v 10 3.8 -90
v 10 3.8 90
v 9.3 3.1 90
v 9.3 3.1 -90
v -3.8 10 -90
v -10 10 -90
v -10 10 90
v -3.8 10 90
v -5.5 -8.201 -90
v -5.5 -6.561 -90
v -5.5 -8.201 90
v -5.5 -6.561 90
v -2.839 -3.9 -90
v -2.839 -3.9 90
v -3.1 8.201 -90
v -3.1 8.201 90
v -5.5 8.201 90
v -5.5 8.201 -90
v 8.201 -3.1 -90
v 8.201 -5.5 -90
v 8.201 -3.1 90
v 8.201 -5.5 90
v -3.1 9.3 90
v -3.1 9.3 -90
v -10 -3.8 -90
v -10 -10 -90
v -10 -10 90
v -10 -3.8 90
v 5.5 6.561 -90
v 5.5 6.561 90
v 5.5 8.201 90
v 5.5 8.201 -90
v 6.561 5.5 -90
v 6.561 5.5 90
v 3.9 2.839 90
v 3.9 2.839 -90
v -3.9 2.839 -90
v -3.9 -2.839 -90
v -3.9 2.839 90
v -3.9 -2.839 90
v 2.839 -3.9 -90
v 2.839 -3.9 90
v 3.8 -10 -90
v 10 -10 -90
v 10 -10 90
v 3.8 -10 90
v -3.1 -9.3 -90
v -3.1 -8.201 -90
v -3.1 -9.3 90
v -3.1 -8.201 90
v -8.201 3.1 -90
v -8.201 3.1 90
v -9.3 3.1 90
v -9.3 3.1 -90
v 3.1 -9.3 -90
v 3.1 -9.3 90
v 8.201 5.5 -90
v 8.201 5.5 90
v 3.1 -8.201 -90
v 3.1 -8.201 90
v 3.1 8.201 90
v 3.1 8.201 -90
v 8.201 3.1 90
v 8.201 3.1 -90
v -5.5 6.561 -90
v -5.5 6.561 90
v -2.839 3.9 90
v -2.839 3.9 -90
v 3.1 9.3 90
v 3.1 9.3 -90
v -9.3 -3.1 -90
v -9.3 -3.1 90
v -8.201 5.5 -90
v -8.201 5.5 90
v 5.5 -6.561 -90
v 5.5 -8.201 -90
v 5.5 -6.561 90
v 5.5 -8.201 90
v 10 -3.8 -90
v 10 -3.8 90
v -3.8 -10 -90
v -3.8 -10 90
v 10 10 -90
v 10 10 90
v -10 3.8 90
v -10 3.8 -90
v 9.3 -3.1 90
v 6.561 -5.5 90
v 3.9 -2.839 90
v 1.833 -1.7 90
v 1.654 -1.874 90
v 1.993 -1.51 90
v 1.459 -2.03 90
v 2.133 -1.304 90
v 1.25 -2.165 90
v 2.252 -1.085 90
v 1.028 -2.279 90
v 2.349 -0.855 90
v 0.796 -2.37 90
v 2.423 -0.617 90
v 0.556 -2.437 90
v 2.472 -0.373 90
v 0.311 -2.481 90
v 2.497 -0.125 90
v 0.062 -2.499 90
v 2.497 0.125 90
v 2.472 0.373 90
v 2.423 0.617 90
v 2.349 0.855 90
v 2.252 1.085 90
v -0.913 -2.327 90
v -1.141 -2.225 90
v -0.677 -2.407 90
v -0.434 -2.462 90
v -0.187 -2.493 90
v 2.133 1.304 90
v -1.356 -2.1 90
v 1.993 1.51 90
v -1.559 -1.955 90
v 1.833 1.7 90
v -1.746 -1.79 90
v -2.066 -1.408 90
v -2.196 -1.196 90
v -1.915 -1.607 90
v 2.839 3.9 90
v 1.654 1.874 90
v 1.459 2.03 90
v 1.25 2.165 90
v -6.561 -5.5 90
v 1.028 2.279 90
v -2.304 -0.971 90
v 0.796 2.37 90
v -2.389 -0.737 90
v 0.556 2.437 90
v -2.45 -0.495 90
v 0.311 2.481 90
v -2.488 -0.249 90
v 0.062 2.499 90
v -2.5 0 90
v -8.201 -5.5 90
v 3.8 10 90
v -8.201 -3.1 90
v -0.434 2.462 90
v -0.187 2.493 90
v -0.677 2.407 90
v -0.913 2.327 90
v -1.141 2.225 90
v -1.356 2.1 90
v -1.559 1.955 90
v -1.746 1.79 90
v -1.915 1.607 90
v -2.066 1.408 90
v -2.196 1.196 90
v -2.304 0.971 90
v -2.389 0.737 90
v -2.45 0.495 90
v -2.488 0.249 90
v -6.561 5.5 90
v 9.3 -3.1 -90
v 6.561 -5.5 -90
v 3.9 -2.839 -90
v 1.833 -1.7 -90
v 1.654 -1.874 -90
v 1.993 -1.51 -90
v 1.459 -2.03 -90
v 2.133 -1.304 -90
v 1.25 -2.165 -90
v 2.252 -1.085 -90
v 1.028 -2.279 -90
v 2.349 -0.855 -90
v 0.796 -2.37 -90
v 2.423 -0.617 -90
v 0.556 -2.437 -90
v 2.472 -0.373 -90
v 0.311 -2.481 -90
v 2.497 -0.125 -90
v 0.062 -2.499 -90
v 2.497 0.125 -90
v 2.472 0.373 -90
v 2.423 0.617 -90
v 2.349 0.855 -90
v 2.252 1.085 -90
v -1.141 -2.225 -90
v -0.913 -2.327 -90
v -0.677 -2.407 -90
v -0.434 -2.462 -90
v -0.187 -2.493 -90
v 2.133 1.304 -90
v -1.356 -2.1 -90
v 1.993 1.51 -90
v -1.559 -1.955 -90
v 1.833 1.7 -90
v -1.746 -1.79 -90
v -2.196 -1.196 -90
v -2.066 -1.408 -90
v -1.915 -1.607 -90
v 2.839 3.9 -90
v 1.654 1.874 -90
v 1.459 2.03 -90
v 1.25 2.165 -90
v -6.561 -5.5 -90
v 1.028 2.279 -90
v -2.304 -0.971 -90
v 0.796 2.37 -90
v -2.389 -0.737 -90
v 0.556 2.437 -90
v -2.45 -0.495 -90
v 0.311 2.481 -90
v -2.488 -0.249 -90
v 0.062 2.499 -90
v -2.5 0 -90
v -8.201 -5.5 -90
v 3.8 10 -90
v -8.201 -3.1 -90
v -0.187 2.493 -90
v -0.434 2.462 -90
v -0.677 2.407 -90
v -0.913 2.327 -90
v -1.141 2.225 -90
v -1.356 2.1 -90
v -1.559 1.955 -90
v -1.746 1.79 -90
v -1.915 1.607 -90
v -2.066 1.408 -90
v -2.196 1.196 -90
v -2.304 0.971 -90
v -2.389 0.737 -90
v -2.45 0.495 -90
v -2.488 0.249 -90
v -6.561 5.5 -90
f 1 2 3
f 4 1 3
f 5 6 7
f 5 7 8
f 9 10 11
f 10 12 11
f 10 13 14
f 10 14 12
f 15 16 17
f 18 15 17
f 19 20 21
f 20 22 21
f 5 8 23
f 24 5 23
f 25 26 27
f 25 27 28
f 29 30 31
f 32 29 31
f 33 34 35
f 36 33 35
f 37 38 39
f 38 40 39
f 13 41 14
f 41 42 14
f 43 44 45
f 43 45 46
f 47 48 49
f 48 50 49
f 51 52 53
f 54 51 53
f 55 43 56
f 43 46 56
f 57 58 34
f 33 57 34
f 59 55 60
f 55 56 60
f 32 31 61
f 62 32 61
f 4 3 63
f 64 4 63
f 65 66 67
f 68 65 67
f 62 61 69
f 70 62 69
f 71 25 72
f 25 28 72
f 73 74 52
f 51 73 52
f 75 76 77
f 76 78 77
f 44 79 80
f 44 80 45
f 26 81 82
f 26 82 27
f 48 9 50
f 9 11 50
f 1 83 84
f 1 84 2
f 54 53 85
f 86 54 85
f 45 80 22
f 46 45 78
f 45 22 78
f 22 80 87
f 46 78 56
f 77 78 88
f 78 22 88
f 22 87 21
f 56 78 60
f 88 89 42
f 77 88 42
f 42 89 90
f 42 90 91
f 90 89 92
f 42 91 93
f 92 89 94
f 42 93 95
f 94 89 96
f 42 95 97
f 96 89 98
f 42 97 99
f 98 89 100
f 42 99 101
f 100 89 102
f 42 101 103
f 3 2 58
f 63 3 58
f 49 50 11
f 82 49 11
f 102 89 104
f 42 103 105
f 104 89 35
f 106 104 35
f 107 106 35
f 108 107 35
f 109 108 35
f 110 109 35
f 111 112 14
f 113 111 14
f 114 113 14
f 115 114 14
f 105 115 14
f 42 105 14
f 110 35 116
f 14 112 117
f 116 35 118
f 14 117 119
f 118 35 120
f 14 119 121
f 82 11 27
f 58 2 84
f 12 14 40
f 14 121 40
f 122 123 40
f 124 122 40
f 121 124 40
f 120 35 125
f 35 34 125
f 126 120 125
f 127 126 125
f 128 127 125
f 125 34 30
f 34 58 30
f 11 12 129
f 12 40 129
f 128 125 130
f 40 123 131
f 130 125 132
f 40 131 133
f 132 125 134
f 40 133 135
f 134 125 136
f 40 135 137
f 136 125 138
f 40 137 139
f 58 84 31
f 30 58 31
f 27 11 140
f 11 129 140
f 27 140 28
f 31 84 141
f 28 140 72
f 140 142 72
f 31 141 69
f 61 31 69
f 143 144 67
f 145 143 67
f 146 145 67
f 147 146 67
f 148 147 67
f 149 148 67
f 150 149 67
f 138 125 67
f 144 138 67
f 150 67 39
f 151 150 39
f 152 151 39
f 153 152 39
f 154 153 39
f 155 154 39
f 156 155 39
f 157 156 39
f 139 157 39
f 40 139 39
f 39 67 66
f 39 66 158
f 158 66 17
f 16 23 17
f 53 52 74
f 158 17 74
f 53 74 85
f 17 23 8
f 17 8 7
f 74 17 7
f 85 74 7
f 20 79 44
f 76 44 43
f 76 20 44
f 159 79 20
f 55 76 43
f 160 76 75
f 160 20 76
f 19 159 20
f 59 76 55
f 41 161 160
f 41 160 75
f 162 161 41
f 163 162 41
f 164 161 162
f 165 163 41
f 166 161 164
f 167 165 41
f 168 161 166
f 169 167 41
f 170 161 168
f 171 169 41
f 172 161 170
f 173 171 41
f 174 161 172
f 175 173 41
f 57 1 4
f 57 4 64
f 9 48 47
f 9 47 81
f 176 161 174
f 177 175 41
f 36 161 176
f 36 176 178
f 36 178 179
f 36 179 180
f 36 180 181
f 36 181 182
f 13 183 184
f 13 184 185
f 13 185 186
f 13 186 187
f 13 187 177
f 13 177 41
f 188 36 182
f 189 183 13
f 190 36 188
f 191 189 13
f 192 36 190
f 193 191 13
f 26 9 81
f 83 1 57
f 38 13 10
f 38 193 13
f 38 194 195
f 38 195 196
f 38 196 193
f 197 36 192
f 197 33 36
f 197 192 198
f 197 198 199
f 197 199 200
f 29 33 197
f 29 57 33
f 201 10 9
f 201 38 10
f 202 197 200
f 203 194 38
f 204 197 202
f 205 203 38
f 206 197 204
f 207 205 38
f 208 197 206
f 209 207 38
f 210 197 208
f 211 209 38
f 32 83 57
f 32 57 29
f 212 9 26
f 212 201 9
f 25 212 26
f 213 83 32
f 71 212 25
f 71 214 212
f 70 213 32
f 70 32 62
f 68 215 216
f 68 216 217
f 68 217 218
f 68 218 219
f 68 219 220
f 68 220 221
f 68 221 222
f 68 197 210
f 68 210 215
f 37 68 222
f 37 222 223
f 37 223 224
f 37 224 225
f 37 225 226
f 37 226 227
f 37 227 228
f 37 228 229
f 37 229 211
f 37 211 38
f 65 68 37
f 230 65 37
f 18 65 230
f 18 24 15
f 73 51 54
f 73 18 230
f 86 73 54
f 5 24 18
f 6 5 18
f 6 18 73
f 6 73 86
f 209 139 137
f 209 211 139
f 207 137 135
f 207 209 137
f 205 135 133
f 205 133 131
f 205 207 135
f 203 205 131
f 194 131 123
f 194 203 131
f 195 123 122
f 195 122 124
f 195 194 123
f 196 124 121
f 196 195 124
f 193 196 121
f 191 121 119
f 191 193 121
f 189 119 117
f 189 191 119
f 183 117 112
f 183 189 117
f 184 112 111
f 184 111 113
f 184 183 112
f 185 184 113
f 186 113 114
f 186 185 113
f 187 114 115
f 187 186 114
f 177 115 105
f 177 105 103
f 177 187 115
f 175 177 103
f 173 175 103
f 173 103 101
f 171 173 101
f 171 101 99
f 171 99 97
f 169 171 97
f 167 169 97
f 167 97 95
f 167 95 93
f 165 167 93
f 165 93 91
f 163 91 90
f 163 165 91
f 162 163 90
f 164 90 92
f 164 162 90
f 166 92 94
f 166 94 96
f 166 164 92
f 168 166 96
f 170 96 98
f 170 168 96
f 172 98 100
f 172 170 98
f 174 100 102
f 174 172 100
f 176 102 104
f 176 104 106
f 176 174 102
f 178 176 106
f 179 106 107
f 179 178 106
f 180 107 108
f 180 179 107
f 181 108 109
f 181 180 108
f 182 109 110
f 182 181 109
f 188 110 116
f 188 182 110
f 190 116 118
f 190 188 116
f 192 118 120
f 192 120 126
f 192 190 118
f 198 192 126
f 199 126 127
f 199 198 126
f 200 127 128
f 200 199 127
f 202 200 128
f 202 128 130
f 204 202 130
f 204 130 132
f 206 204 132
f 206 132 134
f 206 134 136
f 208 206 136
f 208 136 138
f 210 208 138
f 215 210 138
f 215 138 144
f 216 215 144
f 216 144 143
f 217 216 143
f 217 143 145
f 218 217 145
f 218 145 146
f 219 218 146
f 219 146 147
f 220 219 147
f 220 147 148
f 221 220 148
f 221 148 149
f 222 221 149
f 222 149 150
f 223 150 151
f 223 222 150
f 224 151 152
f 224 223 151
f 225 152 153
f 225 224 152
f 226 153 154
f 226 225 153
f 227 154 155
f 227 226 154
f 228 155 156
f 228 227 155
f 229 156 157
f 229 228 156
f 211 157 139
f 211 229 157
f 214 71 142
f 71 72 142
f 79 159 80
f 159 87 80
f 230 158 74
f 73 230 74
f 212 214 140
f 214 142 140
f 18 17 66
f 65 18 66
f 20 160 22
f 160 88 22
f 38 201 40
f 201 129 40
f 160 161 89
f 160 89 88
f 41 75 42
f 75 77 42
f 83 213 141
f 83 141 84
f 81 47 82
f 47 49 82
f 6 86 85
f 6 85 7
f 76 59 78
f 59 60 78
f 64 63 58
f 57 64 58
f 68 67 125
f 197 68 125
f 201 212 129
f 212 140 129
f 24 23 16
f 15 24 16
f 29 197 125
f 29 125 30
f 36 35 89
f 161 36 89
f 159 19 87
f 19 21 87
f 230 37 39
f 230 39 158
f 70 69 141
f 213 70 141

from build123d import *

# Parameters (mm, degrees)
SKETCH1_R           = 2.5
BOSS_EXTRUDE1_DEPTH = 90


with BuildPart() as part:
    # Sketch1 → Boss-Extrude1 (new, symmetric)
    with BuildSketch(Plane.XY):
        Polygon((3.9, -2.839339828), (6.560660172, -5.5), (8.200660172, -5.5), (8.200660172, -3.1), (9.3, -3.1), (10, -3.8), (10, -10), (3.8, -10), (3.1, -9.3), (3.1, -8.200660172), (5.5, -8.200660172), (5.5, -6.560660172), (2.839339828, -3.9), (-2.839339828, -3.9), (-5.5, -6.560660172), (-5.5, -8.200660172), (-3.1, -8.200660172), (-3.1, -9.3), (-3.8, -10), (-10, -10), (-10, -3.8), (-9.3, -3.1), (-8.200660172, -3.1), (-8.200660172, -5.5), (-6.560660172, -5.5), (-3.9, -2.839339828), (-3.9, 2.839339828), (-6.560660172, 5.5), (-8.200660172, 5.5), (-8.200660172, 3.1), (-9.3, 3.1), (-10, 3.8), (-10, 10), (-3.8, 10), (-3.1, 9.3), (-3.1, 8.200660172), (-5.5, 8.200660172), (-5.5, 6.560660172), (-2.839339828, 3.9), (2.839339828, 3.9), (5.5, 6.560660172), (5.5, 8.200660172), (3.1, 8.200660172), (3.1, 9.3), (3.8, 10), (10, 10), (10, 3.8), (9.3, 3.1), (8.200660172, 3.1), (8.200660172, 5.5), (6.560660172, 5.5), (3.9, 2.839339828), align=None)
        with Locations(Location((0, 0, 0), (0, 0, 180))):
            Circle(SKETCH1_R, mode=Mode.SUBTRACT)
    extrude(amount=BOSS_EXTRUDE1_DEPTH, both=True)


solid = part.part
